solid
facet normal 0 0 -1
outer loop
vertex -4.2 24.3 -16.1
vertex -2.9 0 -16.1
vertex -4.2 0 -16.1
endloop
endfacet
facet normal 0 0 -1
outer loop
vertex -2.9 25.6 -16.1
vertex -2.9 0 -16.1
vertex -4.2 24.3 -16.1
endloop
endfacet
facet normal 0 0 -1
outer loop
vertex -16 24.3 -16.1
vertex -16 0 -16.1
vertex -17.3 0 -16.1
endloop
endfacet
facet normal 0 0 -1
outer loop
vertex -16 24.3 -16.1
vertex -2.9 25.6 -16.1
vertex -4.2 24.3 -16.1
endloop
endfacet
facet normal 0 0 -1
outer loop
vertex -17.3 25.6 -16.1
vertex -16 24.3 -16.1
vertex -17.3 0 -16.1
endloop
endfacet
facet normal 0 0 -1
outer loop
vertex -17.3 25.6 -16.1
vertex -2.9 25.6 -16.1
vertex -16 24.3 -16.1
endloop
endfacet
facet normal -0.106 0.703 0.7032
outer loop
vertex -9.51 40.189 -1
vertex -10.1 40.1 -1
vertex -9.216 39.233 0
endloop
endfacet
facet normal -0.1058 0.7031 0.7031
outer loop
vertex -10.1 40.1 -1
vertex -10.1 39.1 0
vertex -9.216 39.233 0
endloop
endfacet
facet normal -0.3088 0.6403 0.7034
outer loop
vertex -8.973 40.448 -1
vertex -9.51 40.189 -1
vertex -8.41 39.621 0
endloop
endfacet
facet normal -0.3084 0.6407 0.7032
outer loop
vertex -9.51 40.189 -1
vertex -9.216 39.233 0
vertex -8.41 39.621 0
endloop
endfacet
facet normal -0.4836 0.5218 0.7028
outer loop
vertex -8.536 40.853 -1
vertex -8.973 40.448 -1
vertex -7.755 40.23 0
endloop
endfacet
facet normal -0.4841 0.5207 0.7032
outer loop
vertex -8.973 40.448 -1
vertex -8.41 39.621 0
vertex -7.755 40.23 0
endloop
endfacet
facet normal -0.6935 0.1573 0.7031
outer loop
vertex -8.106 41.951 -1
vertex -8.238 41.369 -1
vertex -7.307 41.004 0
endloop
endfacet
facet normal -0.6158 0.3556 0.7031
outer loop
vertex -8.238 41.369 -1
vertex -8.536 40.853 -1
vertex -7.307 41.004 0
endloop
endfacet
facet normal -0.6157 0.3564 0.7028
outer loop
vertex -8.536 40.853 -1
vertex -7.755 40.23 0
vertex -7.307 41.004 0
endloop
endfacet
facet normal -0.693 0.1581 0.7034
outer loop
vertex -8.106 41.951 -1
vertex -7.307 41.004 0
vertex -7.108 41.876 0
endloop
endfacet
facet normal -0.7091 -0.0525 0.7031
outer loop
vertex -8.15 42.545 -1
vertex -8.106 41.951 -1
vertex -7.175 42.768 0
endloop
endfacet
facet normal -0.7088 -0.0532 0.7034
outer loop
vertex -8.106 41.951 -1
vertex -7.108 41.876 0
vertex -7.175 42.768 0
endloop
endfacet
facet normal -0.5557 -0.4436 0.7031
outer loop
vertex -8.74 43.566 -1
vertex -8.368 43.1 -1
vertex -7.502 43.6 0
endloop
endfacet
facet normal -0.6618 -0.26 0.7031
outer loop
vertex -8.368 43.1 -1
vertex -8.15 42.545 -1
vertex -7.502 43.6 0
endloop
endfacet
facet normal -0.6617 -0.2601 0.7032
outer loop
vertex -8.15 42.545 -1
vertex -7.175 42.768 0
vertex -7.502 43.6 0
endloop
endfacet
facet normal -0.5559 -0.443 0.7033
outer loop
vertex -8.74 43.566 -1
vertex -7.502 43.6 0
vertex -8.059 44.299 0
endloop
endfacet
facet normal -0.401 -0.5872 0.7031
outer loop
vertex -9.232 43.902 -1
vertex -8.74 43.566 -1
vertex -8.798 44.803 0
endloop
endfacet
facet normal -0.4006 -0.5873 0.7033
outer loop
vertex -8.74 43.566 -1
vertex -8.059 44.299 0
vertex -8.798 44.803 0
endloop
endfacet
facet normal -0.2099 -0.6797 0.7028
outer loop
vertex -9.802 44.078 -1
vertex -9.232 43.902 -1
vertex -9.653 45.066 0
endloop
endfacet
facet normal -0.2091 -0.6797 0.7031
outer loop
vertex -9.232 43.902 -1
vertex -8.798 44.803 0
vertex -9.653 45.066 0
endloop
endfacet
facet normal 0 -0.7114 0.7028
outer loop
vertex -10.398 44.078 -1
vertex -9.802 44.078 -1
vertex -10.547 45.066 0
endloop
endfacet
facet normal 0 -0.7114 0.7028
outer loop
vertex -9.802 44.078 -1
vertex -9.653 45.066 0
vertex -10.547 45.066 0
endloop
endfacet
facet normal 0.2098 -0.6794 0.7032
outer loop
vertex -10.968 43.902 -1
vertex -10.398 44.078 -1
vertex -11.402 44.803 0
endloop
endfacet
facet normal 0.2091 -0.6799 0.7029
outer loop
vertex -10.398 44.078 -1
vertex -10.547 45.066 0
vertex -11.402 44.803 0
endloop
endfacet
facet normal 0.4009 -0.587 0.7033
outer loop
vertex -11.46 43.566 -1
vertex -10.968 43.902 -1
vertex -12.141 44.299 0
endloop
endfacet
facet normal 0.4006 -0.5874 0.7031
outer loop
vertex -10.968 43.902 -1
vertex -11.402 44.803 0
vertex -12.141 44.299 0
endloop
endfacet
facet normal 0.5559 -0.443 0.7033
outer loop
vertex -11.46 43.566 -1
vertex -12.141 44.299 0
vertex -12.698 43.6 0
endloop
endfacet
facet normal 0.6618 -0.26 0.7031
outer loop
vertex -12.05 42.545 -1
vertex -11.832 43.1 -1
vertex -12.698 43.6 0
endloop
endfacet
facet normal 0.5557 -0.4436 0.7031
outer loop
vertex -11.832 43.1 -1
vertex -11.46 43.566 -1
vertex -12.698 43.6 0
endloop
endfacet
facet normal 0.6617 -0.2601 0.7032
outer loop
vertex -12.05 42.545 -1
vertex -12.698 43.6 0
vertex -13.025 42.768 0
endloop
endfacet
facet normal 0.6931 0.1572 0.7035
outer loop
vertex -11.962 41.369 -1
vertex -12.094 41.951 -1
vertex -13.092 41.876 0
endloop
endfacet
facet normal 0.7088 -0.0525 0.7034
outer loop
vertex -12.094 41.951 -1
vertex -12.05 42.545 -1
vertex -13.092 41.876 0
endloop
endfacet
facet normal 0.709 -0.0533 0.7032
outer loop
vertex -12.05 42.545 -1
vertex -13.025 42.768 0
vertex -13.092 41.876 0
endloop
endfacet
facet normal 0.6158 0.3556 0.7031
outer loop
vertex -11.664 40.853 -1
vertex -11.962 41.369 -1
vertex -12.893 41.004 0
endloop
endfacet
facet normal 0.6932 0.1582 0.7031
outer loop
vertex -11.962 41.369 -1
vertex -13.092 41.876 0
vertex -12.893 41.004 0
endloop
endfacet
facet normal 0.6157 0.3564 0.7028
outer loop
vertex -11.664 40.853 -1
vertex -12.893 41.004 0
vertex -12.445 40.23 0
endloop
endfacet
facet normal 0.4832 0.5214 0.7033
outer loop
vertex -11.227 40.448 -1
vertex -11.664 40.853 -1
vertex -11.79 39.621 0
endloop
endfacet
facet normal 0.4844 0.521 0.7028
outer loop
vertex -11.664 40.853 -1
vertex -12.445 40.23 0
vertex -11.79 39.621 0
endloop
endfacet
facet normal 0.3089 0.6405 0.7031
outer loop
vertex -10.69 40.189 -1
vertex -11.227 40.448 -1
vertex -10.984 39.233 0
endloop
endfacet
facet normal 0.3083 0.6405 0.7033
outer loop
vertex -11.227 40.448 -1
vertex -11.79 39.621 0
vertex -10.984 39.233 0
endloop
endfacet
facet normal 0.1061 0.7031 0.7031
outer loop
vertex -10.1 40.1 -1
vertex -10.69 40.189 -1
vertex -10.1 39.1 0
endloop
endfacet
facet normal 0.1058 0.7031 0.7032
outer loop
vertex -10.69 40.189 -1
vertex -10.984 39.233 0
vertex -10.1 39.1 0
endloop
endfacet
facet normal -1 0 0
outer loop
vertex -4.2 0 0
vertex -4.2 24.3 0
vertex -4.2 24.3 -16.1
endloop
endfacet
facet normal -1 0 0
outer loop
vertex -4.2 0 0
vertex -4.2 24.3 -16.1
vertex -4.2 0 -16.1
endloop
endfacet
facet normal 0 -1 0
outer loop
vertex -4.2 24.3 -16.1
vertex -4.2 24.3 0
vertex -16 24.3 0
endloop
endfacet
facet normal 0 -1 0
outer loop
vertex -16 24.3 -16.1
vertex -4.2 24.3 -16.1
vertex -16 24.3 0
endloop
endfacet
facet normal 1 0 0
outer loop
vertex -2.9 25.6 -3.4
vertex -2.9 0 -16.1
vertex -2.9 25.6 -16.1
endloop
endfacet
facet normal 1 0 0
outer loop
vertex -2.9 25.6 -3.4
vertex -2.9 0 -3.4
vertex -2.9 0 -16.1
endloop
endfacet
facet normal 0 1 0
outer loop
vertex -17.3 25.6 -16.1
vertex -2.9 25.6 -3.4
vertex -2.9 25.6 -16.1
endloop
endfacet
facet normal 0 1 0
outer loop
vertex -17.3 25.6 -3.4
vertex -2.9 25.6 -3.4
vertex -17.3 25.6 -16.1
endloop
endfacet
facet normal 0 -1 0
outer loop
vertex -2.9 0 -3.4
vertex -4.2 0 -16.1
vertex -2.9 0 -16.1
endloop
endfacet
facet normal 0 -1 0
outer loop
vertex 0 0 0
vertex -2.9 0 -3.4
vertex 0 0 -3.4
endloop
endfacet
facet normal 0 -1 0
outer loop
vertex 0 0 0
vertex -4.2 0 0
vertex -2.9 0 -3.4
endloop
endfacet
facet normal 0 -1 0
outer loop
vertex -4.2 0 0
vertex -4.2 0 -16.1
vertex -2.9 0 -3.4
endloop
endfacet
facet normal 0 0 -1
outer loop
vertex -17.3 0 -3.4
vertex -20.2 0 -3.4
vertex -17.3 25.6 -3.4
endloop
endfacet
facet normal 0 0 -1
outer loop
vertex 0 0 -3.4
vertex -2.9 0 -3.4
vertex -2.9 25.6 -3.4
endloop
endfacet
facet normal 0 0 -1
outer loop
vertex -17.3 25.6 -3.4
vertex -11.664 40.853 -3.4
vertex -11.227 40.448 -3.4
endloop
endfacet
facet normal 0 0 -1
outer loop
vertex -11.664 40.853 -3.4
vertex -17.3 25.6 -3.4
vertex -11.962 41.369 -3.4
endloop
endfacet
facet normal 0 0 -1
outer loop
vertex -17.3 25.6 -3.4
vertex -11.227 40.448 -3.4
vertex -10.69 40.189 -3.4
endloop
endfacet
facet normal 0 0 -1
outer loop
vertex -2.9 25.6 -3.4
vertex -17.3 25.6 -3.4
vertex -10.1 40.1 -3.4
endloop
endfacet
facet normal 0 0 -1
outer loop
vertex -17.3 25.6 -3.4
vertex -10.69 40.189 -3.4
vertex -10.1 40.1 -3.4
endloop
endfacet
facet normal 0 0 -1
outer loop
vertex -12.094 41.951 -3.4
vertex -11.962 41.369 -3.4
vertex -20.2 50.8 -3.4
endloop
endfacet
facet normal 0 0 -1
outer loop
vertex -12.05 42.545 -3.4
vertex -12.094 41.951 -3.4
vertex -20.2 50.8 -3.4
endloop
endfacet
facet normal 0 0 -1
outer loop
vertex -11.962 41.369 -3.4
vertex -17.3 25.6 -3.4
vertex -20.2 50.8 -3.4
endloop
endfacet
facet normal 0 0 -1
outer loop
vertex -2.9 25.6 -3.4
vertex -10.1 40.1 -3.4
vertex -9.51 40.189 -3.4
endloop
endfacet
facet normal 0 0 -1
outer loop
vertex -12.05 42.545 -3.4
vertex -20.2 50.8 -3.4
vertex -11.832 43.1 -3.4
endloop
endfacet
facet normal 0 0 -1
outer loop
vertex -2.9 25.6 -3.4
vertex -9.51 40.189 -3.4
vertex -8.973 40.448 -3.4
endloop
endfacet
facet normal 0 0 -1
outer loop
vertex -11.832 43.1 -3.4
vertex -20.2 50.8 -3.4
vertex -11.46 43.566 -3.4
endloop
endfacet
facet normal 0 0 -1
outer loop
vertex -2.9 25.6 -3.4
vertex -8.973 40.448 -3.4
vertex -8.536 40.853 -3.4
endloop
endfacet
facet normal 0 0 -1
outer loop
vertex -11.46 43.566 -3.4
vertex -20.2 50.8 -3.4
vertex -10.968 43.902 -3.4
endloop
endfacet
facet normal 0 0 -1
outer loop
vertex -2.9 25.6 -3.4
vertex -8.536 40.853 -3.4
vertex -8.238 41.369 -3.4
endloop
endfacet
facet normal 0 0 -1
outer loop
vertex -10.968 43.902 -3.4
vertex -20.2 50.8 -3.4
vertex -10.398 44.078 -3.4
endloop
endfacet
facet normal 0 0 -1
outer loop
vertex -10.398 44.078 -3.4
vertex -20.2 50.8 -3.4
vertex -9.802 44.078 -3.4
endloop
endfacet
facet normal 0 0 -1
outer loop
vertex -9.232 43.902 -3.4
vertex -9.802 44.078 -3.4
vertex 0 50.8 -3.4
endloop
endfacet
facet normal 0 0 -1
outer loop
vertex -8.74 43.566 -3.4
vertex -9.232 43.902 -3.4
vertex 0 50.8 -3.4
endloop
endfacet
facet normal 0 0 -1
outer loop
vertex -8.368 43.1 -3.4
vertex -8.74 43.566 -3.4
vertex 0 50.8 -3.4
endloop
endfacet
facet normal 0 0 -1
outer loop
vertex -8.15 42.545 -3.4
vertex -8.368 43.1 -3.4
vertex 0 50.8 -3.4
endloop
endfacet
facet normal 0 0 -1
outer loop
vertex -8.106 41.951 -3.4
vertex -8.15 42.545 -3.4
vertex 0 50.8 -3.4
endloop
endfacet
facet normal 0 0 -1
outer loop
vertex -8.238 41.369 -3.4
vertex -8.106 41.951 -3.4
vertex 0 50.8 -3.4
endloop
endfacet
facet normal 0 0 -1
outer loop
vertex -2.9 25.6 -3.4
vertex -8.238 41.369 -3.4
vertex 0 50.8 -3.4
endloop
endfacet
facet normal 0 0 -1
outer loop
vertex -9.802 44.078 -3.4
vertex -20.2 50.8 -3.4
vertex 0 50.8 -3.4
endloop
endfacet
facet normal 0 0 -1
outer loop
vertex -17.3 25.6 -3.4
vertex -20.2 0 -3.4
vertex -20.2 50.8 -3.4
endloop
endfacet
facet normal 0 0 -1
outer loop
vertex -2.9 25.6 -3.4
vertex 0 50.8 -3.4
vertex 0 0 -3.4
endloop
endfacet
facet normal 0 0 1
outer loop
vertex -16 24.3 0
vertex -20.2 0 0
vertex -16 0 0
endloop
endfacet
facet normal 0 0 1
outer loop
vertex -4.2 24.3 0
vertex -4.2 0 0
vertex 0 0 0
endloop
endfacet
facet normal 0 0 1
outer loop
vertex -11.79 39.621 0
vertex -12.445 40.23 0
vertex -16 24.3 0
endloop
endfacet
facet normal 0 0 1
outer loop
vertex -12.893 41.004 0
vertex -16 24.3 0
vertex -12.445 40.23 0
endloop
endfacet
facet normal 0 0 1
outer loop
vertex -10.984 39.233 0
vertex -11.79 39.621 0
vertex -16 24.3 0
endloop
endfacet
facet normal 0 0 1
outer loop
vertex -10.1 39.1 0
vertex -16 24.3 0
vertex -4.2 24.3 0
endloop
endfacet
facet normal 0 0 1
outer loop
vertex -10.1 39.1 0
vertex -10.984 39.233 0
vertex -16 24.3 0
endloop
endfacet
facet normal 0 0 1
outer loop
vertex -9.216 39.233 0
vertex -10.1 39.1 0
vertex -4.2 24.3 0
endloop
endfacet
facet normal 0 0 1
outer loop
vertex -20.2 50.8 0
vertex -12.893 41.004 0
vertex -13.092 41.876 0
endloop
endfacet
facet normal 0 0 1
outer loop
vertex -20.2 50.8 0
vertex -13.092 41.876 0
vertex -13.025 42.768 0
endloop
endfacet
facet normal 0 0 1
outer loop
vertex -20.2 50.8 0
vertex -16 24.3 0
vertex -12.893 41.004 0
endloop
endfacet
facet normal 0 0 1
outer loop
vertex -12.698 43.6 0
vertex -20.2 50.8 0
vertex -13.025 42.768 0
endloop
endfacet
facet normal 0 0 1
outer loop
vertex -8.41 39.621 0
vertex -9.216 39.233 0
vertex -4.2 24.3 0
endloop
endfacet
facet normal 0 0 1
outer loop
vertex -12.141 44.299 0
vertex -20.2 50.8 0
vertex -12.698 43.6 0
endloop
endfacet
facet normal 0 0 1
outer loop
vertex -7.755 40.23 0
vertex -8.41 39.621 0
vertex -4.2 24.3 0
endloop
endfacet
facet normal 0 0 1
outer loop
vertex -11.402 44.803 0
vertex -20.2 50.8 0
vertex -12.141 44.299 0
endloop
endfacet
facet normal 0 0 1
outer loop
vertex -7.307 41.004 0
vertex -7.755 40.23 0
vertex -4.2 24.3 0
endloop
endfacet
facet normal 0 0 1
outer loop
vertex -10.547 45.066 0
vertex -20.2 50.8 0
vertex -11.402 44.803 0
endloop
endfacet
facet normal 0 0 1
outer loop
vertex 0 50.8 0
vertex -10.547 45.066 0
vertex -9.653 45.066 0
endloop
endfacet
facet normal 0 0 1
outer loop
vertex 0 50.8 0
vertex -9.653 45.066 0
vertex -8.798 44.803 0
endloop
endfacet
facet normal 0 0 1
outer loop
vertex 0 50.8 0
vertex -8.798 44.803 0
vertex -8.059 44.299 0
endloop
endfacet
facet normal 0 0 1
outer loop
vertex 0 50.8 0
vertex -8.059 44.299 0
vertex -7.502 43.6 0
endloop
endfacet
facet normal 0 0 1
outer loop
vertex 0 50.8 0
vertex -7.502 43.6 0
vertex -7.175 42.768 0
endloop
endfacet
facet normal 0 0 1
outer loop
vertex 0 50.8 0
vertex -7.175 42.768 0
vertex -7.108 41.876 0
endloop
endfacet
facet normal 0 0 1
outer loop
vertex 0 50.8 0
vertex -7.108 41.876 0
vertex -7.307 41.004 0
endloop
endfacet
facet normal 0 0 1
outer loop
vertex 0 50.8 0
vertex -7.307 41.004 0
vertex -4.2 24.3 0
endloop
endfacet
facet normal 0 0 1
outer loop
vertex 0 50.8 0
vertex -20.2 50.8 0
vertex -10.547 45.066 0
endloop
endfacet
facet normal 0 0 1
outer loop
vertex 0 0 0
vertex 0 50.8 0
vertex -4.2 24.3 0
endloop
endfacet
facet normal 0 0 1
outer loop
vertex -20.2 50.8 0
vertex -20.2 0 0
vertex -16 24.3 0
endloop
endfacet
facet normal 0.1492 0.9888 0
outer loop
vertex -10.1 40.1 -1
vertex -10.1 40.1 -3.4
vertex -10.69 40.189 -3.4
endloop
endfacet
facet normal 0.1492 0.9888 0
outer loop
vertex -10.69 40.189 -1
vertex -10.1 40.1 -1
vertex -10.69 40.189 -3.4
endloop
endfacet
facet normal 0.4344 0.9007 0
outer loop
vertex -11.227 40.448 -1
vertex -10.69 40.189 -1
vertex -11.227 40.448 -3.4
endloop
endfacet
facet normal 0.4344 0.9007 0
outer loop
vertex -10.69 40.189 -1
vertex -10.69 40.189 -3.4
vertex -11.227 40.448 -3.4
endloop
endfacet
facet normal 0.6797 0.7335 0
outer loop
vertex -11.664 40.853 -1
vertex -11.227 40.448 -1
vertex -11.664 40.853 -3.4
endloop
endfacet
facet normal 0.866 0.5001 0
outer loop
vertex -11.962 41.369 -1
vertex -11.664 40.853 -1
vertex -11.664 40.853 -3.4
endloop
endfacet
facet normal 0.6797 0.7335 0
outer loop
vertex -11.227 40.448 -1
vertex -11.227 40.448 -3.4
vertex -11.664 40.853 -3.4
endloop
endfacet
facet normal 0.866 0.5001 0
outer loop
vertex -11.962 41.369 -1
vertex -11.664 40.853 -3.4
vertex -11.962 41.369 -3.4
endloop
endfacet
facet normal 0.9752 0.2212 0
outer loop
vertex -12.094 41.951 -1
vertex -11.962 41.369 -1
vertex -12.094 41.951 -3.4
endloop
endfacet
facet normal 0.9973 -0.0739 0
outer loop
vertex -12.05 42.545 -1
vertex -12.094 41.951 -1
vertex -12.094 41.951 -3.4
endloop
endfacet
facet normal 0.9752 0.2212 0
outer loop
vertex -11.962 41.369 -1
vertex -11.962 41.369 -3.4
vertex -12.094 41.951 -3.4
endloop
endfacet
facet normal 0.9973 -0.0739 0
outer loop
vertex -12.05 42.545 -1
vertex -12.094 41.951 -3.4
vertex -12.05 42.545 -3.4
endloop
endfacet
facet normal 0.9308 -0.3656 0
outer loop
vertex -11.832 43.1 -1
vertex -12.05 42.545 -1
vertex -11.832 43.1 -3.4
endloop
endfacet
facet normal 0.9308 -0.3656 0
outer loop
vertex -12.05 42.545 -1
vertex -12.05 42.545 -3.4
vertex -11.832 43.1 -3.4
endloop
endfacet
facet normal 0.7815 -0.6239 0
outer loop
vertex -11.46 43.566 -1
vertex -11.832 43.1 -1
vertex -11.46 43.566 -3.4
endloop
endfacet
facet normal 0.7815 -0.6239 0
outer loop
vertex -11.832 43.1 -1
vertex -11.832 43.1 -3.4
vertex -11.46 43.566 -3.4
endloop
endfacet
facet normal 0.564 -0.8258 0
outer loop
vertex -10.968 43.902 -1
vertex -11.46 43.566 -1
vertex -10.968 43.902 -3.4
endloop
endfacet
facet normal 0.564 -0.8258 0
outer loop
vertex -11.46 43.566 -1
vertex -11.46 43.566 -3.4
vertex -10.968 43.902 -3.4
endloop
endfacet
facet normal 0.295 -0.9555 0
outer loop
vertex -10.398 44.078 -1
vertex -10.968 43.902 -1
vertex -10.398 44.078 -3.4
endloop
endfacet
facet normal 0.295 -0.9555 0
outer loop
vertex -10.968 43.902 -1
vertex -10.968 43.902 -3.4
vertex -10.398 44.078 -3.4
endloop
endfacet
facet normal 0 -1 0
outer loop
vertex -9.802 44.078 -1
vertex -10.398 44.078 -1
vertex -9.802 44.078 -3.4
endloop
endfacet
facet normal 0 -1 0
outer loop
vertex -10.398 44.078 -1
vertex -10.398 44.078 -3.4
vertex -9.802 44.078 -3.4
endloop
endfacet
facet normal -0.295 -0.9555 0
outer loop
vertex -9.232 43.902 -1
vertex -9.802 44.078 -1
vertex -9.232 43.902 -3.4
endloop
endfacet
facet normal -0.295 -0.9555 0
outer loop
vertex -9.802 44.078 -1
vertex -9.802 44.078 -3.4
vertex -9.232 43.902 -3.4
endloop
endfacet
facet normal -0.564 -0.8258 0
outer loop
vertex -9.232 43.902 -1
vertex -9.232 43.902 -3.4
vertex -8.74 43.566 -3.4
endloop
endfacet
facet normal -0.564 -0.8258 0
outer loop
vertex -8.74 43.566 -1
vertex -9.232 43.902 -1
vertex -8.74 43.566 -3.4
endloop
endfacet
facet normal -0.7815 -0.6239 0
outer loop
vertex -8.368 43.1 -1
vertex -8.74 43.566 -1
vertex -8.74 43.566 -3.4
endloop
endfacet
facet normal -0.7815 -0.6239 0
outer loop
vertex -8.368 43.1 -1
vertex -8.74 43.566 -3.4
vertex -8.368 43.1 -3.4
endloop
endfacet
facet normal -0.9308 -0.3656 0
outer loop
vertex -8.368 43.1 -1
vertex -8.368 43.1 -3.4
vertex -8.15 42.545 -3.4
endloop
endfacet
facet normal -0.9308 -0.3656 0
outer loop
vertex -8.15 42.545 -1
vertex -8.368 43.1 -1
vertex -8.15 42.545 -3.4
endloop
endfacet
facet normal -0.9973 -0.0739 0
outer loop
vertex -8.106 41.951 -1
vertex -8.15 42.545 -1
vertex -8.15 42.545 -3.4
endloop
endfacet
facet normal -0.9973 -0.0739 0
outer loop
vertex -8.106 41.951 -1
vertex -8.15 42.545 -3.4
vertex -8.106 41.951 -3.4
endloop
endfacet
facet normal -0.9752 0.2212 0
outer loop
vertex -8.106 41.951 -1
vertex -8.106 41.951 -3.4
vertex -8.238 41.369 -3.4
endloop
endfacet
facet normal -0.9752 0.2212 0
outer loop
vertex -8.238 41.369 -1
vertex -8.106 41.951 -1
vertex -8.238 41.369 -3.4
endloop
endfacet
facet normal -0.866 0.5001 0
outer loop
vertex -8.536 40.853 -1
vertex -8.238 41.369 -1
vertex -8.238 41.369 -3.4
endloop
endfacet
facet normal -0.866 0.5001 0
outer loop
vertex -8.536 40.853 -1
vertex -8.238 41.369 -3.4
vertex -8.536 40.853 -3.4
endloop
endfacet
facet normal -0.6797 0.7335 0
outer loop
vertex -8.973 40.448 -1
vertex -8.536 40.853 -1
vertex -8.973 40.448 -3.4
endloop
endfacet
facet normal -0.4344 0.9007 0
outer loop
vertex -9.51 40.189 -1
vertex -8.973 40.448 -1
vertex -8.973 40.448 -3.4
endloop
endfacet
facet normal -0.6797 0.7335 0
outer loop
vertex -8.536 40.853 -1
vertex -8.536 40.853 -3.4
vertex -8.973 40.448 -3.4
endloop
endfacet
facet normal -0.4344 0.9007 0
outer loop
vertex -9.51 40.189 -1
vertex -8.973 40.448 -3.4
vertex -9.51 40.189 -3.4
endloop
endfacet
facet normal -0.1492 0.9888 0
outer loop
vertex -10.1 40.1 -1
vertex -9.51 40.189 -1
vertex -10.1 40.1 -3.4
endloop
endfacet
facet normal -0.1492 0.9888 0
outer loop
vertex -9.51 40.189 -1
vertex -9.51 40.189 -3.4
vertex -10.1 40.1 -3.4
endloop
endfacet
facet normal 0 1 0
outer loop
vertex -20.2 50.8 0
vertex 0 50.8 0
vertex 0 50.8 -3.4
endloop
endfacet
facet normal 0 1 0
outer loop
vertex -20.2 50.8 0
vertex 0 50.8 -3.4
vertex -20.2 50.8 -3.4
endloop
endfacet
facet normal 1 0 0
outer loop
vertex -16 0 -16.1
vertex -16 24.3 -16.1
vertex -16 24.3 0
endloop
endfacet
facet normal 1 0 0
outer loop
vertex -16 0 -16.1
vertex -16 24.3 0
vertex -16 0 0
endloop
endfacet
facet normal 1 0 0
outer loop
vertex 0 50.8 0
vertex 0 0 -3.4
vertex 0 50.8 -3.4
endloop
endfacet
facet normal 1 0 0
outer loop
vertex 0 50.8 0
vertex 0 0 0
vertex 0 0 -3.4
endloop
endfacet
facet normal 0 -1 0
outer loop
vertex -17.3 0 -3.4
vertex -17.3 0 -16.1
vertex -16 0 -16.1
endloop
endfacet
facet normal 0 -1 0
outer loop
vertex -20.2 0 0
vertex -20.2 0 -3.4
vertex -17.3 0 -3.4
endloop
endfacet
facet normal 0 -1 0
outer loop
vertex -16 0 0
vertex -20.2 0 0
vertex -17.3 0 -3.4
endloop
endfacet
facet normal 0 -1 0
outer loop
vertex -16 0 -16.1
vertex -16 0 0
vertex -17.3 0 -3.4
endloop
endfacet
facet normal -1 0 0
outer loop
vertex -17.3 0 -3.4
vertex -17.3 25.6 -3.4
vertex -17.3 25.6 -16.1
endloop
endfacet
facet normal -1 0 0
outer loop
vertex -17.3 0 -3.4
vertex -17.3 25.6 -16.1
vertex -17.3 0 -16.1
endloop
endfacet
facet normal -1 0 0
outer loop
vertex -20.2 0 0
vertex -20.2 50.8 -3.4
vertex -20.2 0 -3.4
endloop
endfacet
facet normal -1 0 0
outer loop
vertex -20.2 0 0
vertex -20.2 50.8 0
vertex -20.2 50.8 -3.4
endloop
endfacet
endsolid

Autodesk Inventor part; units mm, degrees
ref_plane "YZ Plane" through (0, 0, 0) normal (1, 0, 0) x (0, 1, 0)
ref_plane "XZ Plane" through (0, 0, 0) normal (0, 1, 0) x (-1, 0, 0)
ref_plane "XY Plane" through (0, 0, 0) normal (0, 0, 1) x (1, 0, 0)
sketch "Boceto1" plane through (0, 0, 0) normal (0, 0, 1) x (1, 0, 0)
  line L0 (0, 50.8) -> (-20.2, 50.8)
  line L1 (-20.2, 50.8) -> (-20.2, 0)
  line L2 (-20.2, 0) -> (0, 0)
  line L3 (0, 0) -> (0, 50.8)
  dimension "d0" = 50.8
  dimension "d1" = 20.2
extrude "Extrusión1" add sketch "Boceto1" against normal blind 3.4
sketch "Boceto3" plane through (0, 0, 0) normal (0, 0, -1) x (-1, 0, 0)
  line L0 (20.2, 50.8) -> (0, 50.8) construction
  line L1 (0, 50.8) -> (0, 0) construction
  circle A0 centre (10.1, 42.1) radius 2
  line L2 (20.2, 0) -> (20.2, 50.8) projected
  dimension "d20" = 4
  dimension "d21" = 10.1
  dimension "d23" = 8.7
hole "Agujero3" at (-10.1, 42.1, 0) direction (0, 0, -1) diameter 4 end through all countersink diameter 6 countersink angle 90
sketch "Boceto6" plane through (0, 0, -3.4) normal (0, 0, -1) x (-1, 0, 0)
  line L0 (0, 0) -> (20.2, 0) projected
  line L1 (2.9, 0) -> (2.9, 25.6)
  line L2 (2.9, 25.6) -> (17.3, 25.6)
  line L3 (17.3, 25.6) -> (17.3, 0)
  line L4 (16, 0) -> (16, 24.3)
  line L5 (16, 24.3) -> (4.2, 24.3)
  line L6 (4.2, 24.3) -> (4.2, 0)
  line L7 (0, 50.8) -> (0, 0) projected
  line L8 (20.2, 0) -> (20.2, 50.8) projected
  circle A0 centre (10.1, 42.1) radius 2 projected
  point P0 (4.2, 0)
  point P1 (16, 0)
  dimension "d40" = 1.3
  dimension "d50" = 14.4
  dimension "d51" = 2.9
  dimension "d52" = 2.9
  dimension "d54" = 25.6
  dimension "d55" = 16.5
extrude "Extrusión3" add sketch "Boceto6" along normal blind 12.7 contours L1 L2 L3 L0 L4 L5 L6
sketch "Boceto7" plane through (0, 0, -3.4) normal (0, 0, -1) x (-1, 0, 0)
  line L0 (16, 24.3) -> (16, 0) projected
  line L1 (4.2, 24.3) -> (16, 24.3)
  line L2 (16, 24.3) -> (16, 0)
  line L3 (16, 0) -> (4.2, 0)
  line L4 (4.2, 0) -> (4.2, 24.3)
  point P0 (0, 0)
extrude "Extrusión4" cut sketch "Boceto7" against normal blind 10
properties part number "PLU-45 TAPÓN ENCUENTRO CORREDERA (2)" material "Plástico ABS"
